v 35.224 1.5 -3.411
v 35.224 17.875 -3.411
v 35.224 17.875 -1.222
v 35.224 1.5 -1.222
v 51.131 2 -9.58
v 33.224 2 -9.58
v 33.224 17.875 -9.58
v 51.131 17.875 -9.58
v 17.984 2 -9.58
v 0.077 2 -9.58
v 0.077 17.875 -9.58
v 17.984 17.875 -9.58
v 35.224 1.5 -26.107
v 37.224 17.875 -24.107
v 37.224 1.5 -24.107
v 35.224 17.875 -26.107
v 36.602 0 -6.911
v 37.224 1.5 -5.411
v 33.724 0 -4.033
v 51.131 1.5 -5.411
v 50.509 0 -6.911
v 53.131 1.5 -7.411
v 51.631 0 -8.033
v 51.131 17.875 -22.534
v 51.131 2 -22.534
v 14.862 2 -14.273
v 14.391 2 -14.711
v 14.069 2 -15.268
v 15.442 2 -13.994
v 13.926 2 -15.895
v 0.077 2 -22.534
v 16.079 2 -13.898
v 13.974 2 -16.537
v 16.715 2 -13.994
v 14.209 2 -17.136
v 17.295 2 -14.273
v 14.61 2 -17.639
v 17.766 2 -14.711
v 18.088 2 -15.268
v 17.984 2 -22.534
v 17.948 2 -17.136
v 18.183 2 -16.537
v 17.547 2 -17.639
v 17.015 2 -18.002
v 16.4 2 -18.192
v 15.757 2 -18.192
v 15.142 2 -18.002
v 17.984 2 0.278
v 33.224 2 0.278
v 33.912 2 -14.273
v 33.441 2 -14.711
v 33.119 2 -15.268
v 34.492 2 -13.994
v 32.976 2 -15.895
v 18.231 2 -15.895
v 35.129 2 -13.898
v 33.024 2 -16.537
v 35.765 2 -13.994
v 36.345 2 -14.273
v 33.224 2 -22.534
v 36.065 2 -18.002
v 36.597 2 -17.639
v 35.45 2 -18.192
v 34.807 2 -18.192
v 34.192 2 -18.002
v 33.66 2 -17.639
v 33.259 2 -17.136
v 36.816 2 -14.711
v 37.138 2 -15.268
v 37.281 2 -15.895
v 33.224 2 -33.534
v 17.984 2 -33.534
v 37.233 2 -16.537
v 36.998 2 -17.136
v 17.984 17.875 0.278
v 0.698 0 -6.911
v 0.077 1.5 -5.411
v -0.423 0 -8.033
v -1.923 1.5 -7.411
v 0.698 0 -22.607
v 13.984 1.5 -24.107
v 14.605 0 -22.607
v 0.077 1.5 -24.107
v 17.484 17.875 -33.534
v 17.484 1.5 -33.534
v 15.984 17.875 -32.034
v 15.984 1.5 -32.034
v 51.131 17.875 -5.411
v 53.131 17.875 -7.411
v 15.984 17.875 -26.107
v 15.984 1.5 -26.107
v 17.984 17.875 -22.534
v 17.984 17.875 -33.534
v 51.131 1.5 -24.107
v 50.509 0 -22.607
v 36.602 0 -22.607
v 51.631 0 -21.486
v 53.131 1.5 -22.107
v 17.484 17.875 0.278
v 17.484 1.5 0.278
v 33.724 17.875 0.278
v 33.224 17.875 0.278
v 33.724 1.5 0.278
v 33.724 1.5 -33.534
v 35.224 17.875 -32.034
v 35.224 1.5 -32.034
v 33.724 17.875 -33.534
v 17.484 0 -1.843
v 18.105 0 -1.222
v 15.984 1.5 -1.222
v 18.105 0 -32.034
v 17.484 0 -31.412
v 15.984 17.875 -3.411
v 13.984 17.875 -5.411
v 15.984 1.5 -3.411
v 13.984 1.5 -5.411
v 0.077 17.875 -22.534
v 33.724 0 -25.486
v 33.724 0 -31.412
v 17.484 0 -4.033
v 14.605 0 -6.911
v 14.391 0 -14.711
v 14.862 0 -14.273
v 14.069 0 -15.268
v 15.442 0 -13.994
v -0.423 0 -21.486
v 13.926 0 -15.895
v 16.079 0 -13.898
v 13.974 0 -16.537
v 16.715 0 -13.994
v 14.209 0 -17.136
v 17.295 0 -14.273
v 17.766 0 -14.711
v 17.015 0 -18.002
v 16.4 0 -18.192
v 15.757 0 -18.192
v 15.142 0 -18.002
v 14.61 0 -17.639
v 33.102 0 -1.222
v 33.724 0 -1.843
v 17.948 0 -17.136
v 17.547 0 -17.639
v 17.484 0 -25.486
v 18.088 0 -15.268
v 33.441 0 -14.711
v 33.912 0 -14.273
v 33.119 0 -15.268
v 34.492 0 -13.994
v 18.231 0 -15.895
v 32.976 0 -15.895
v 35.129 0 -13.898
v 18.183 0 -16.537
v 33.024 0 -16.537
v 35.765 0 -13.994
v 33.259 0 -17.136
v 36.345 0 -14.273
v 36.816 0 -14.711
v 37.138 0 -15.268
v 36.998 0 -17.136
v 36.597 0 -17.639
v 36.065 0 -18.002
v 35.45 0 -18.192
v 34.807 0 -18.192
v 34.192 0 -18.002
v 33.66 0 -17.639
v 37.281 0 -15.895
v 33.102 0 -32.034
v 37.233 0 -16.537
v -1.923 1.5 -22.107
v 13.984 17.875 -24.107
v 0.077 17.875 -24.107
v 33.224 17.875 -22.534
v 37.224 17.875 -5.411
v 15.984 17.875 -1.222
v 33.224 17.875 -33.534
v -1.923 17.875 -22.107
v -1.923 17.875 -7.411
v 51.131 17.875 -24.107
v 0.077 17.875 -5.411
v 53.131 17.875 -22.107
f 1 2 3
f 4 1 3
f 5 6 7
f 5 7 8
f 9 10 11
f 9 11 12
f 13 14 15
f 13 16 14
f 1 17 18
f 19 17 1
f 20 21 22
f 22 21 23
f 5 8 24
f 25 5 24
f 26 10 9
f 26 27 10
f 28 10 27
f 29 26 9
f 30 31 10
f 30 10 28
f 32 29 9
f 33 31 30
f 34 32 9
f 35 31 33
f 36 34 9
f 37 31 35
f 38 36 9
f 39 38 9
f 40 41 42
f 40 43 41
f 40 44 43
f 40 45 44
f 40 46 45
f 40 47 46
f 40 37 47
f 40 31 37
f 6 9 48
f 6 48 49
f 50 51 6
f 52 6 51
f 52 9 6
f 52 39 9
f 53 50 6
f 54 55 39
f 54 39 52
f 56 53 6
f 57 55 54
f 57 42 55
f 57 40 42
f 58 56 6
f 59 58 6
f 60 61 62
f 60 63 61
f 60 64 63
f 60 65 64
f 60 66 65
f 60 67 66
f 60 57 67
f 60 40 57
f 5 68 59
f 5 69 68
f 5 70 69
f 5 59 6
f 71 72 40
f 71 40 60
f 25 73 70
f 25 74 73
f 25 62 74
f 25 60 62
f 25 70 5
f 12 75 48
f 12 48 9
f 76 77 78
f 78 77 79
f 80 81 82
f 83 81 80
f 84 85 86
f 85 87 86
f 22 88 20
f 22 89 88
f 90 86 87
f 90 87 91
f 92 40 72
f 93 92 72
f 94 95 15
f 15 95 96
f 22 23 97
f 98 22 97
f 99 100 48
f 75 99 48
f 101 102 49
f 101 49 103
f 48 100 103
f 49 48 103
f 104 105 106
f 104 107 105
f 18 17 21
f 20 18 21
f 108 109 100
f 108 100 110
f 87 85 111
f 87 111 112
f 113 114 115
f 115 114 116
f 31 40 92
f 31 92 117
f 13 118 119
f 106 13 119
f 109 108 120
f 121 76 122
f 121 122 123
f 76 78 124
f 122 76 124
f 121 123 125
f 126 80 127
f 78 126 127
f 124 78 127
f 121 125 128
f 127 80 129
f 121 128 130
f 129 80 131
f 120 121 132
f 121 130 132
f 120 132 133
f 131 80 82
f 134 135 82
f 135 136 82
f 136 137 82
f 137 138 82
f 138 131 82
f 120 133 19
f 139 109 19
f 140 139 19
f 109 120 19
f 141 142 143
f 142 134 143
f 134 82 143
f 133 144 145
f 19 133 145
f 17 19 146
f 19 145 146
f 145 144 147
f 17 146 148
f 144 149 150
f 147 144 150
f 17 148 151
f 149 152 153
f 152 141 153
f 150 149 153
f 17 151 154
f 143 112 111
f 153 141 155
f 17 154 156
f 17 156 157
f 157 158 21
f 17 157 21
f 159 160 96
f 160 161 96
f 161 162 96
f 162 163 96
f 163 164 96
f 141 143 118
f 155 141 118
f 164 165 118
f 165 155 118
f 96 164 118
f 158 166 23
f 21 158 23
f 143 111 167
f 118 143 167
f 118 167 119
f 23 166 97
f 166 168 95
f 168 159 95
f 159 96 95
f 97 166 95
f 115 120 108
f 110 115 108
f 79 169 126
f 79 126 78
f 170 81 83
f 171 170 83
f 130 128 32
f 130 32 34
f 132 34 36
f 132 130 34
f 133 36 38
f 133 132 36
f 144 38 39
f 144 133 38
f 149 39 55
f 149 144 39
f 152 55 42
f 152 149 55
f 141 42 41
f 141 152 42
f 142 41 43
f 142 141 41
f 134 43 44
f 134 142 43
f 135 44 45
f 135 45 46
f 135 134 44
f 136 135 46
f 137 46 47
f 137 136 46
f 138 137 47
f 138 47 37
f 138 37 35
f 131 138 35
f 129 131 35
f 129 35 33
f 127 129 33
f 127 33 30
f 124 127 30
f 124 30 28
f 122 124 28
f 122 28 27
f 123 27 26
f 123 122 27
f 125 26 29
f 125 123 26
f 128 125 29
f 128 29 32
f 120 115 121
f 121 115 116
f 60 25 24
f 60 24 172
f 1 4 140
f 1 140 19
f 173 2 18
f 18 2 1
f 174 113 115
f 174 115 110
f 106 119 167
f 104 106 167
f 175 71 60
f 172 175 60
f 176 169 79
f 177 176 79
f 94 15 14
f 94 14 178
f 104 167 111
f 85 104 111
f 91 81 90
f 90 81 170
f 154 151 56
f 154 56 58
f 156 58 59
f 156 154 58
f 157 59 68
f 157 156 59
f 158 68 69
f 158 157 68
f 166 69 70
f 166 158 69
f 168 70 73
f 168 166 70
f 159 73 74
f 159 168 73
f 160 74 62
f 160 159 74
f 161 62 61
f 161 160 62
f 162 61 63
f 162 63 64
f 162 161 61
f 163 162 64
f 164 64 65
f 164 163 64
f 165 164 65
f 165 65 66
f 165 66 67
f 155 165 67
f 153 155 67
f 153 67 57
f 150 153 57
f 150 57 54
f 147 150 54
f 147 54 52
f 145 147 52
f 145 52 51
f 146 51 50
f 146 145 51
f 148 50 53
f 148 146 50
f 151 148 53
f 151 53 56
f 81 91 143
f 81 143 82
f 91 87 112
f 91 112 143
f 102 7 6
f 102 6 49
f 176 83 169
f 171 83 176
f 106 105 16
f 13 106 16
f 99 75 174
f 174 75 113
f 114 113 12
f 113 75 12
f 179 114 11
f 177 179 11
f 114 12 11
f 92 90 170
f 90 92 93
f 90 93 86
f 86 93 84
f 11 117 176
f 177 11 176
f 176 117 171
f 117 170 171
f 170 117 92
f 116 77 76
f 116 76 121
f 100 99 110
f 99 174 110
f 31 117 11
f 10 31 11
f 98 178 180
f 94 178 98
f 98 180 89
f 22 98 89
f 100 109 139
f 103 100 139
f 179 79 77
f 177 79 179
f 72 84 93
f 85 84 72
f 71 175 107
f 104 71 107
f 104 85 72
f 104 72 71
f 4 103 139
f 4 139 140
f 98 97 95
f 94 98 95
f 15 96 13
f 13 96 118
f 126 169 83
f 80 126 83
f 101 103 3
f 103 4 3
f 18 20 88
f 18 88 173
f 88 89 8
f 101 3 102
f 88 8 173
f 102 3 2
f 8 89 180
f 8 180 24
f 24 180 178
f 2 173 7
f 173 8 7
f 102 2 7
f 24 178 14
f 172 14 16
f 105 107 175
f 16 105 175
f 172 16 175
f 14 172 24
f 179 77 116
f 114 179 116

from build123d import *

# Parameters (mm, degrees)
SKETCH1_R           = 2.159
BOSS_EXTRUDE1_DEPTH = 2
BOSS_EXTRUDE2_DEPTH = 15.875
CHAMFER1_SIZE       = 2
CHAMFER2_SIZE       = 2
CHAMFER3_SIZE       = 1.5
CHAMFER4_SIZE       = 1.5
CHAMFER5_SIZE       = 1.5


with BuildPart() as part:
    # Sketch1 → Boss-Extrude1 (new body)
    with BuildSketch(Plane(origin=(0, 0, 0), x_dir=(1, 0, 0), z_dir=(0, 1, 0))):
        Polygon((35.223504259, 33.533672595), (15.983504259, 33.533672595), (15.983504259, 24.107172595), (-1.923495741, 24.107172595), (-1.923495741, 5.411272595), (15.983504259, 5.411272595), (15.983504259, -0.278017555), (35.223504259, -0.278017555), (35.223504259, 5.411272595), (53.130504259, 5.411272595), (53.130504259, 24.107172595), (35.223504259, 24.107172595), align=None)
        with Locations(Location((16.078504259, 16.056672595, 0), (0, 0, 270))):
            Circle(SKETCH1_R, mode=Mode.SUBTRACT)
        with Locations(Location((35.128504259, 16.056672595, 0), (0, 0, 270))):
            Circle(SKETCH1_R, mode=Mode.SUBTRACT)
    extrude(amount=BOSS_EXTRUDE1_DEPTH)

    # Sketch3 → Boss-Extrude2 (add)
    with BuildSketch(Plane(origin=(0, 2, 0), x_dir=(1, 0, 0), z_dir=(0, 1, 0))):
        Polygon((33.223504259, 30.817862745), (33.223504259, 33.533672595), (35.223504259, 33.533672595), (35.223504259, 24.107172595), (53.130504259, 24.107172595), (53.130504259, 5.411272595), (35.223504259, 5.411272595), (35.223504259, -0.278017555), (33.223504259, -0.278017555), (33.223504259, 1.721982445), (33.223504259, 9.579672595), (51.130504259, 9.579672595), (51.130504259, 22.533672595), (33.223504259, 22.533672595), align=None)
        Polygon((17.983504259, 1.721982445), (17.983504259, -0.278017555), (15.983504259, -0.278017555), (15.983504259, 5.411272595), (-1.923495741, 5.411272595), (-1.923495741, 24.107172595), (15.983504259, 24.107172595), (15.983504259, 33.533672595), (17.983504259, 33.533672595), (17.983504259, 29.040712972), (17.983504259, 22.533672595), (0.076504259, 22.533672595), (0.076504259, 9.579672595), (17.983504259, 9.579672595), align=None)
    extrude(amount=BOSS_EXTRUDE2_DEPTH)

    # Chamfer1
    chamfer1_edges = [part.edges().sort_by_distance(p)[0] for p in [
        (53.130504259, 8.9375, -24.107172595),
        (53.130504259, 8.9375, -5.411272595),
        (-1.923495741, 8.9375, -5.411272595),
        (-1.923495741, 8.9375, -24.107172595),
    ]]
    chamfer(chamfer1_edges, length=CHAMFER1_SIZE)

    # Chamfer2
    chamfer2_edges = [part.edges().sort_by_distance(p)[0] for p in [
        (35.223504259, 8.9375, -24.107172595),
        (35.223504259, 8.9375, -5.411272595),
        (15.983504259, 8.9375, -5.411272595),
        (15.983504259, 8.9375, -24.107172595),
    ]]
    chamfer(chamfer2_edges, length=CHAMFER2_SIZE)

    # Chamfer3
    chamfer3_edges = [part.edges().sort_by_distance(p)[0] for p in [
        (15.983504259, 8.9375, -33.533672595),
        (35.223504259, 8.9375, -33.533672595),
    ]]
    chamfer(chamfer3_edges, length=CHAMFER3_SIZE)

    # Chamfer4
    chamfer4_edges = [part.edges().sort_by_distance(p)[0] for p in [
        (35.223504259, 8.9375, 0.278017555),
        (15.983504259, 8.9375, 0.278017555),
    ]]
    chamfer(chamfer4_edges, length=CHAMFER4_SIZE)

    # Chamfer5
    chamfer5_edges = [part.edges().sort_by_distance(p)[0] for p in [
        (53.130504259, 0, -14.759222595),
        (44.177004259, 0, -24.107172595),
        (7.030004259, 0, -5.411272595),
        (-1.923495741, 0, -14.759222595),
        (-0.923495741, 0, -6.411272595),
        (-0.923495741, 0, -23.107172595),
        (52.130504259, 0, -23.107172595),
        (52.130504259, 0, -6.411272595),
        (44.177004259, 0, -5.411272595),
        (15.983504259, 0, -2.31662752),
        (7.030004259, 0, -24.107172595),
        (35.223504259, 0, -29.070422595),
        (36.223504259, 0, -4.411272595),
        (14.983504259, 0, -4.411272595),
        (14.983504259, 0, -25.107172595),
        (36.223504259, 0, -25.107172595),
        (15.983504259, 0, -29.070422595),
        (25.603504259, 0, -33.533672595),
        (34.473504259, 0, -32.783672595),
        (16.733504259, 0, -32.783672595),
        (25.603504259, 0, 0.278017555),
        (35.223504259, 0, -2.31662752),
        (34.473504259, 0, -0.471982445),
        (16.733504259, 0, -0.471982445),
    ]]
    chamfer(chamfer5_edges, length=CHAMFER5_SIZE)


solid = part.part
